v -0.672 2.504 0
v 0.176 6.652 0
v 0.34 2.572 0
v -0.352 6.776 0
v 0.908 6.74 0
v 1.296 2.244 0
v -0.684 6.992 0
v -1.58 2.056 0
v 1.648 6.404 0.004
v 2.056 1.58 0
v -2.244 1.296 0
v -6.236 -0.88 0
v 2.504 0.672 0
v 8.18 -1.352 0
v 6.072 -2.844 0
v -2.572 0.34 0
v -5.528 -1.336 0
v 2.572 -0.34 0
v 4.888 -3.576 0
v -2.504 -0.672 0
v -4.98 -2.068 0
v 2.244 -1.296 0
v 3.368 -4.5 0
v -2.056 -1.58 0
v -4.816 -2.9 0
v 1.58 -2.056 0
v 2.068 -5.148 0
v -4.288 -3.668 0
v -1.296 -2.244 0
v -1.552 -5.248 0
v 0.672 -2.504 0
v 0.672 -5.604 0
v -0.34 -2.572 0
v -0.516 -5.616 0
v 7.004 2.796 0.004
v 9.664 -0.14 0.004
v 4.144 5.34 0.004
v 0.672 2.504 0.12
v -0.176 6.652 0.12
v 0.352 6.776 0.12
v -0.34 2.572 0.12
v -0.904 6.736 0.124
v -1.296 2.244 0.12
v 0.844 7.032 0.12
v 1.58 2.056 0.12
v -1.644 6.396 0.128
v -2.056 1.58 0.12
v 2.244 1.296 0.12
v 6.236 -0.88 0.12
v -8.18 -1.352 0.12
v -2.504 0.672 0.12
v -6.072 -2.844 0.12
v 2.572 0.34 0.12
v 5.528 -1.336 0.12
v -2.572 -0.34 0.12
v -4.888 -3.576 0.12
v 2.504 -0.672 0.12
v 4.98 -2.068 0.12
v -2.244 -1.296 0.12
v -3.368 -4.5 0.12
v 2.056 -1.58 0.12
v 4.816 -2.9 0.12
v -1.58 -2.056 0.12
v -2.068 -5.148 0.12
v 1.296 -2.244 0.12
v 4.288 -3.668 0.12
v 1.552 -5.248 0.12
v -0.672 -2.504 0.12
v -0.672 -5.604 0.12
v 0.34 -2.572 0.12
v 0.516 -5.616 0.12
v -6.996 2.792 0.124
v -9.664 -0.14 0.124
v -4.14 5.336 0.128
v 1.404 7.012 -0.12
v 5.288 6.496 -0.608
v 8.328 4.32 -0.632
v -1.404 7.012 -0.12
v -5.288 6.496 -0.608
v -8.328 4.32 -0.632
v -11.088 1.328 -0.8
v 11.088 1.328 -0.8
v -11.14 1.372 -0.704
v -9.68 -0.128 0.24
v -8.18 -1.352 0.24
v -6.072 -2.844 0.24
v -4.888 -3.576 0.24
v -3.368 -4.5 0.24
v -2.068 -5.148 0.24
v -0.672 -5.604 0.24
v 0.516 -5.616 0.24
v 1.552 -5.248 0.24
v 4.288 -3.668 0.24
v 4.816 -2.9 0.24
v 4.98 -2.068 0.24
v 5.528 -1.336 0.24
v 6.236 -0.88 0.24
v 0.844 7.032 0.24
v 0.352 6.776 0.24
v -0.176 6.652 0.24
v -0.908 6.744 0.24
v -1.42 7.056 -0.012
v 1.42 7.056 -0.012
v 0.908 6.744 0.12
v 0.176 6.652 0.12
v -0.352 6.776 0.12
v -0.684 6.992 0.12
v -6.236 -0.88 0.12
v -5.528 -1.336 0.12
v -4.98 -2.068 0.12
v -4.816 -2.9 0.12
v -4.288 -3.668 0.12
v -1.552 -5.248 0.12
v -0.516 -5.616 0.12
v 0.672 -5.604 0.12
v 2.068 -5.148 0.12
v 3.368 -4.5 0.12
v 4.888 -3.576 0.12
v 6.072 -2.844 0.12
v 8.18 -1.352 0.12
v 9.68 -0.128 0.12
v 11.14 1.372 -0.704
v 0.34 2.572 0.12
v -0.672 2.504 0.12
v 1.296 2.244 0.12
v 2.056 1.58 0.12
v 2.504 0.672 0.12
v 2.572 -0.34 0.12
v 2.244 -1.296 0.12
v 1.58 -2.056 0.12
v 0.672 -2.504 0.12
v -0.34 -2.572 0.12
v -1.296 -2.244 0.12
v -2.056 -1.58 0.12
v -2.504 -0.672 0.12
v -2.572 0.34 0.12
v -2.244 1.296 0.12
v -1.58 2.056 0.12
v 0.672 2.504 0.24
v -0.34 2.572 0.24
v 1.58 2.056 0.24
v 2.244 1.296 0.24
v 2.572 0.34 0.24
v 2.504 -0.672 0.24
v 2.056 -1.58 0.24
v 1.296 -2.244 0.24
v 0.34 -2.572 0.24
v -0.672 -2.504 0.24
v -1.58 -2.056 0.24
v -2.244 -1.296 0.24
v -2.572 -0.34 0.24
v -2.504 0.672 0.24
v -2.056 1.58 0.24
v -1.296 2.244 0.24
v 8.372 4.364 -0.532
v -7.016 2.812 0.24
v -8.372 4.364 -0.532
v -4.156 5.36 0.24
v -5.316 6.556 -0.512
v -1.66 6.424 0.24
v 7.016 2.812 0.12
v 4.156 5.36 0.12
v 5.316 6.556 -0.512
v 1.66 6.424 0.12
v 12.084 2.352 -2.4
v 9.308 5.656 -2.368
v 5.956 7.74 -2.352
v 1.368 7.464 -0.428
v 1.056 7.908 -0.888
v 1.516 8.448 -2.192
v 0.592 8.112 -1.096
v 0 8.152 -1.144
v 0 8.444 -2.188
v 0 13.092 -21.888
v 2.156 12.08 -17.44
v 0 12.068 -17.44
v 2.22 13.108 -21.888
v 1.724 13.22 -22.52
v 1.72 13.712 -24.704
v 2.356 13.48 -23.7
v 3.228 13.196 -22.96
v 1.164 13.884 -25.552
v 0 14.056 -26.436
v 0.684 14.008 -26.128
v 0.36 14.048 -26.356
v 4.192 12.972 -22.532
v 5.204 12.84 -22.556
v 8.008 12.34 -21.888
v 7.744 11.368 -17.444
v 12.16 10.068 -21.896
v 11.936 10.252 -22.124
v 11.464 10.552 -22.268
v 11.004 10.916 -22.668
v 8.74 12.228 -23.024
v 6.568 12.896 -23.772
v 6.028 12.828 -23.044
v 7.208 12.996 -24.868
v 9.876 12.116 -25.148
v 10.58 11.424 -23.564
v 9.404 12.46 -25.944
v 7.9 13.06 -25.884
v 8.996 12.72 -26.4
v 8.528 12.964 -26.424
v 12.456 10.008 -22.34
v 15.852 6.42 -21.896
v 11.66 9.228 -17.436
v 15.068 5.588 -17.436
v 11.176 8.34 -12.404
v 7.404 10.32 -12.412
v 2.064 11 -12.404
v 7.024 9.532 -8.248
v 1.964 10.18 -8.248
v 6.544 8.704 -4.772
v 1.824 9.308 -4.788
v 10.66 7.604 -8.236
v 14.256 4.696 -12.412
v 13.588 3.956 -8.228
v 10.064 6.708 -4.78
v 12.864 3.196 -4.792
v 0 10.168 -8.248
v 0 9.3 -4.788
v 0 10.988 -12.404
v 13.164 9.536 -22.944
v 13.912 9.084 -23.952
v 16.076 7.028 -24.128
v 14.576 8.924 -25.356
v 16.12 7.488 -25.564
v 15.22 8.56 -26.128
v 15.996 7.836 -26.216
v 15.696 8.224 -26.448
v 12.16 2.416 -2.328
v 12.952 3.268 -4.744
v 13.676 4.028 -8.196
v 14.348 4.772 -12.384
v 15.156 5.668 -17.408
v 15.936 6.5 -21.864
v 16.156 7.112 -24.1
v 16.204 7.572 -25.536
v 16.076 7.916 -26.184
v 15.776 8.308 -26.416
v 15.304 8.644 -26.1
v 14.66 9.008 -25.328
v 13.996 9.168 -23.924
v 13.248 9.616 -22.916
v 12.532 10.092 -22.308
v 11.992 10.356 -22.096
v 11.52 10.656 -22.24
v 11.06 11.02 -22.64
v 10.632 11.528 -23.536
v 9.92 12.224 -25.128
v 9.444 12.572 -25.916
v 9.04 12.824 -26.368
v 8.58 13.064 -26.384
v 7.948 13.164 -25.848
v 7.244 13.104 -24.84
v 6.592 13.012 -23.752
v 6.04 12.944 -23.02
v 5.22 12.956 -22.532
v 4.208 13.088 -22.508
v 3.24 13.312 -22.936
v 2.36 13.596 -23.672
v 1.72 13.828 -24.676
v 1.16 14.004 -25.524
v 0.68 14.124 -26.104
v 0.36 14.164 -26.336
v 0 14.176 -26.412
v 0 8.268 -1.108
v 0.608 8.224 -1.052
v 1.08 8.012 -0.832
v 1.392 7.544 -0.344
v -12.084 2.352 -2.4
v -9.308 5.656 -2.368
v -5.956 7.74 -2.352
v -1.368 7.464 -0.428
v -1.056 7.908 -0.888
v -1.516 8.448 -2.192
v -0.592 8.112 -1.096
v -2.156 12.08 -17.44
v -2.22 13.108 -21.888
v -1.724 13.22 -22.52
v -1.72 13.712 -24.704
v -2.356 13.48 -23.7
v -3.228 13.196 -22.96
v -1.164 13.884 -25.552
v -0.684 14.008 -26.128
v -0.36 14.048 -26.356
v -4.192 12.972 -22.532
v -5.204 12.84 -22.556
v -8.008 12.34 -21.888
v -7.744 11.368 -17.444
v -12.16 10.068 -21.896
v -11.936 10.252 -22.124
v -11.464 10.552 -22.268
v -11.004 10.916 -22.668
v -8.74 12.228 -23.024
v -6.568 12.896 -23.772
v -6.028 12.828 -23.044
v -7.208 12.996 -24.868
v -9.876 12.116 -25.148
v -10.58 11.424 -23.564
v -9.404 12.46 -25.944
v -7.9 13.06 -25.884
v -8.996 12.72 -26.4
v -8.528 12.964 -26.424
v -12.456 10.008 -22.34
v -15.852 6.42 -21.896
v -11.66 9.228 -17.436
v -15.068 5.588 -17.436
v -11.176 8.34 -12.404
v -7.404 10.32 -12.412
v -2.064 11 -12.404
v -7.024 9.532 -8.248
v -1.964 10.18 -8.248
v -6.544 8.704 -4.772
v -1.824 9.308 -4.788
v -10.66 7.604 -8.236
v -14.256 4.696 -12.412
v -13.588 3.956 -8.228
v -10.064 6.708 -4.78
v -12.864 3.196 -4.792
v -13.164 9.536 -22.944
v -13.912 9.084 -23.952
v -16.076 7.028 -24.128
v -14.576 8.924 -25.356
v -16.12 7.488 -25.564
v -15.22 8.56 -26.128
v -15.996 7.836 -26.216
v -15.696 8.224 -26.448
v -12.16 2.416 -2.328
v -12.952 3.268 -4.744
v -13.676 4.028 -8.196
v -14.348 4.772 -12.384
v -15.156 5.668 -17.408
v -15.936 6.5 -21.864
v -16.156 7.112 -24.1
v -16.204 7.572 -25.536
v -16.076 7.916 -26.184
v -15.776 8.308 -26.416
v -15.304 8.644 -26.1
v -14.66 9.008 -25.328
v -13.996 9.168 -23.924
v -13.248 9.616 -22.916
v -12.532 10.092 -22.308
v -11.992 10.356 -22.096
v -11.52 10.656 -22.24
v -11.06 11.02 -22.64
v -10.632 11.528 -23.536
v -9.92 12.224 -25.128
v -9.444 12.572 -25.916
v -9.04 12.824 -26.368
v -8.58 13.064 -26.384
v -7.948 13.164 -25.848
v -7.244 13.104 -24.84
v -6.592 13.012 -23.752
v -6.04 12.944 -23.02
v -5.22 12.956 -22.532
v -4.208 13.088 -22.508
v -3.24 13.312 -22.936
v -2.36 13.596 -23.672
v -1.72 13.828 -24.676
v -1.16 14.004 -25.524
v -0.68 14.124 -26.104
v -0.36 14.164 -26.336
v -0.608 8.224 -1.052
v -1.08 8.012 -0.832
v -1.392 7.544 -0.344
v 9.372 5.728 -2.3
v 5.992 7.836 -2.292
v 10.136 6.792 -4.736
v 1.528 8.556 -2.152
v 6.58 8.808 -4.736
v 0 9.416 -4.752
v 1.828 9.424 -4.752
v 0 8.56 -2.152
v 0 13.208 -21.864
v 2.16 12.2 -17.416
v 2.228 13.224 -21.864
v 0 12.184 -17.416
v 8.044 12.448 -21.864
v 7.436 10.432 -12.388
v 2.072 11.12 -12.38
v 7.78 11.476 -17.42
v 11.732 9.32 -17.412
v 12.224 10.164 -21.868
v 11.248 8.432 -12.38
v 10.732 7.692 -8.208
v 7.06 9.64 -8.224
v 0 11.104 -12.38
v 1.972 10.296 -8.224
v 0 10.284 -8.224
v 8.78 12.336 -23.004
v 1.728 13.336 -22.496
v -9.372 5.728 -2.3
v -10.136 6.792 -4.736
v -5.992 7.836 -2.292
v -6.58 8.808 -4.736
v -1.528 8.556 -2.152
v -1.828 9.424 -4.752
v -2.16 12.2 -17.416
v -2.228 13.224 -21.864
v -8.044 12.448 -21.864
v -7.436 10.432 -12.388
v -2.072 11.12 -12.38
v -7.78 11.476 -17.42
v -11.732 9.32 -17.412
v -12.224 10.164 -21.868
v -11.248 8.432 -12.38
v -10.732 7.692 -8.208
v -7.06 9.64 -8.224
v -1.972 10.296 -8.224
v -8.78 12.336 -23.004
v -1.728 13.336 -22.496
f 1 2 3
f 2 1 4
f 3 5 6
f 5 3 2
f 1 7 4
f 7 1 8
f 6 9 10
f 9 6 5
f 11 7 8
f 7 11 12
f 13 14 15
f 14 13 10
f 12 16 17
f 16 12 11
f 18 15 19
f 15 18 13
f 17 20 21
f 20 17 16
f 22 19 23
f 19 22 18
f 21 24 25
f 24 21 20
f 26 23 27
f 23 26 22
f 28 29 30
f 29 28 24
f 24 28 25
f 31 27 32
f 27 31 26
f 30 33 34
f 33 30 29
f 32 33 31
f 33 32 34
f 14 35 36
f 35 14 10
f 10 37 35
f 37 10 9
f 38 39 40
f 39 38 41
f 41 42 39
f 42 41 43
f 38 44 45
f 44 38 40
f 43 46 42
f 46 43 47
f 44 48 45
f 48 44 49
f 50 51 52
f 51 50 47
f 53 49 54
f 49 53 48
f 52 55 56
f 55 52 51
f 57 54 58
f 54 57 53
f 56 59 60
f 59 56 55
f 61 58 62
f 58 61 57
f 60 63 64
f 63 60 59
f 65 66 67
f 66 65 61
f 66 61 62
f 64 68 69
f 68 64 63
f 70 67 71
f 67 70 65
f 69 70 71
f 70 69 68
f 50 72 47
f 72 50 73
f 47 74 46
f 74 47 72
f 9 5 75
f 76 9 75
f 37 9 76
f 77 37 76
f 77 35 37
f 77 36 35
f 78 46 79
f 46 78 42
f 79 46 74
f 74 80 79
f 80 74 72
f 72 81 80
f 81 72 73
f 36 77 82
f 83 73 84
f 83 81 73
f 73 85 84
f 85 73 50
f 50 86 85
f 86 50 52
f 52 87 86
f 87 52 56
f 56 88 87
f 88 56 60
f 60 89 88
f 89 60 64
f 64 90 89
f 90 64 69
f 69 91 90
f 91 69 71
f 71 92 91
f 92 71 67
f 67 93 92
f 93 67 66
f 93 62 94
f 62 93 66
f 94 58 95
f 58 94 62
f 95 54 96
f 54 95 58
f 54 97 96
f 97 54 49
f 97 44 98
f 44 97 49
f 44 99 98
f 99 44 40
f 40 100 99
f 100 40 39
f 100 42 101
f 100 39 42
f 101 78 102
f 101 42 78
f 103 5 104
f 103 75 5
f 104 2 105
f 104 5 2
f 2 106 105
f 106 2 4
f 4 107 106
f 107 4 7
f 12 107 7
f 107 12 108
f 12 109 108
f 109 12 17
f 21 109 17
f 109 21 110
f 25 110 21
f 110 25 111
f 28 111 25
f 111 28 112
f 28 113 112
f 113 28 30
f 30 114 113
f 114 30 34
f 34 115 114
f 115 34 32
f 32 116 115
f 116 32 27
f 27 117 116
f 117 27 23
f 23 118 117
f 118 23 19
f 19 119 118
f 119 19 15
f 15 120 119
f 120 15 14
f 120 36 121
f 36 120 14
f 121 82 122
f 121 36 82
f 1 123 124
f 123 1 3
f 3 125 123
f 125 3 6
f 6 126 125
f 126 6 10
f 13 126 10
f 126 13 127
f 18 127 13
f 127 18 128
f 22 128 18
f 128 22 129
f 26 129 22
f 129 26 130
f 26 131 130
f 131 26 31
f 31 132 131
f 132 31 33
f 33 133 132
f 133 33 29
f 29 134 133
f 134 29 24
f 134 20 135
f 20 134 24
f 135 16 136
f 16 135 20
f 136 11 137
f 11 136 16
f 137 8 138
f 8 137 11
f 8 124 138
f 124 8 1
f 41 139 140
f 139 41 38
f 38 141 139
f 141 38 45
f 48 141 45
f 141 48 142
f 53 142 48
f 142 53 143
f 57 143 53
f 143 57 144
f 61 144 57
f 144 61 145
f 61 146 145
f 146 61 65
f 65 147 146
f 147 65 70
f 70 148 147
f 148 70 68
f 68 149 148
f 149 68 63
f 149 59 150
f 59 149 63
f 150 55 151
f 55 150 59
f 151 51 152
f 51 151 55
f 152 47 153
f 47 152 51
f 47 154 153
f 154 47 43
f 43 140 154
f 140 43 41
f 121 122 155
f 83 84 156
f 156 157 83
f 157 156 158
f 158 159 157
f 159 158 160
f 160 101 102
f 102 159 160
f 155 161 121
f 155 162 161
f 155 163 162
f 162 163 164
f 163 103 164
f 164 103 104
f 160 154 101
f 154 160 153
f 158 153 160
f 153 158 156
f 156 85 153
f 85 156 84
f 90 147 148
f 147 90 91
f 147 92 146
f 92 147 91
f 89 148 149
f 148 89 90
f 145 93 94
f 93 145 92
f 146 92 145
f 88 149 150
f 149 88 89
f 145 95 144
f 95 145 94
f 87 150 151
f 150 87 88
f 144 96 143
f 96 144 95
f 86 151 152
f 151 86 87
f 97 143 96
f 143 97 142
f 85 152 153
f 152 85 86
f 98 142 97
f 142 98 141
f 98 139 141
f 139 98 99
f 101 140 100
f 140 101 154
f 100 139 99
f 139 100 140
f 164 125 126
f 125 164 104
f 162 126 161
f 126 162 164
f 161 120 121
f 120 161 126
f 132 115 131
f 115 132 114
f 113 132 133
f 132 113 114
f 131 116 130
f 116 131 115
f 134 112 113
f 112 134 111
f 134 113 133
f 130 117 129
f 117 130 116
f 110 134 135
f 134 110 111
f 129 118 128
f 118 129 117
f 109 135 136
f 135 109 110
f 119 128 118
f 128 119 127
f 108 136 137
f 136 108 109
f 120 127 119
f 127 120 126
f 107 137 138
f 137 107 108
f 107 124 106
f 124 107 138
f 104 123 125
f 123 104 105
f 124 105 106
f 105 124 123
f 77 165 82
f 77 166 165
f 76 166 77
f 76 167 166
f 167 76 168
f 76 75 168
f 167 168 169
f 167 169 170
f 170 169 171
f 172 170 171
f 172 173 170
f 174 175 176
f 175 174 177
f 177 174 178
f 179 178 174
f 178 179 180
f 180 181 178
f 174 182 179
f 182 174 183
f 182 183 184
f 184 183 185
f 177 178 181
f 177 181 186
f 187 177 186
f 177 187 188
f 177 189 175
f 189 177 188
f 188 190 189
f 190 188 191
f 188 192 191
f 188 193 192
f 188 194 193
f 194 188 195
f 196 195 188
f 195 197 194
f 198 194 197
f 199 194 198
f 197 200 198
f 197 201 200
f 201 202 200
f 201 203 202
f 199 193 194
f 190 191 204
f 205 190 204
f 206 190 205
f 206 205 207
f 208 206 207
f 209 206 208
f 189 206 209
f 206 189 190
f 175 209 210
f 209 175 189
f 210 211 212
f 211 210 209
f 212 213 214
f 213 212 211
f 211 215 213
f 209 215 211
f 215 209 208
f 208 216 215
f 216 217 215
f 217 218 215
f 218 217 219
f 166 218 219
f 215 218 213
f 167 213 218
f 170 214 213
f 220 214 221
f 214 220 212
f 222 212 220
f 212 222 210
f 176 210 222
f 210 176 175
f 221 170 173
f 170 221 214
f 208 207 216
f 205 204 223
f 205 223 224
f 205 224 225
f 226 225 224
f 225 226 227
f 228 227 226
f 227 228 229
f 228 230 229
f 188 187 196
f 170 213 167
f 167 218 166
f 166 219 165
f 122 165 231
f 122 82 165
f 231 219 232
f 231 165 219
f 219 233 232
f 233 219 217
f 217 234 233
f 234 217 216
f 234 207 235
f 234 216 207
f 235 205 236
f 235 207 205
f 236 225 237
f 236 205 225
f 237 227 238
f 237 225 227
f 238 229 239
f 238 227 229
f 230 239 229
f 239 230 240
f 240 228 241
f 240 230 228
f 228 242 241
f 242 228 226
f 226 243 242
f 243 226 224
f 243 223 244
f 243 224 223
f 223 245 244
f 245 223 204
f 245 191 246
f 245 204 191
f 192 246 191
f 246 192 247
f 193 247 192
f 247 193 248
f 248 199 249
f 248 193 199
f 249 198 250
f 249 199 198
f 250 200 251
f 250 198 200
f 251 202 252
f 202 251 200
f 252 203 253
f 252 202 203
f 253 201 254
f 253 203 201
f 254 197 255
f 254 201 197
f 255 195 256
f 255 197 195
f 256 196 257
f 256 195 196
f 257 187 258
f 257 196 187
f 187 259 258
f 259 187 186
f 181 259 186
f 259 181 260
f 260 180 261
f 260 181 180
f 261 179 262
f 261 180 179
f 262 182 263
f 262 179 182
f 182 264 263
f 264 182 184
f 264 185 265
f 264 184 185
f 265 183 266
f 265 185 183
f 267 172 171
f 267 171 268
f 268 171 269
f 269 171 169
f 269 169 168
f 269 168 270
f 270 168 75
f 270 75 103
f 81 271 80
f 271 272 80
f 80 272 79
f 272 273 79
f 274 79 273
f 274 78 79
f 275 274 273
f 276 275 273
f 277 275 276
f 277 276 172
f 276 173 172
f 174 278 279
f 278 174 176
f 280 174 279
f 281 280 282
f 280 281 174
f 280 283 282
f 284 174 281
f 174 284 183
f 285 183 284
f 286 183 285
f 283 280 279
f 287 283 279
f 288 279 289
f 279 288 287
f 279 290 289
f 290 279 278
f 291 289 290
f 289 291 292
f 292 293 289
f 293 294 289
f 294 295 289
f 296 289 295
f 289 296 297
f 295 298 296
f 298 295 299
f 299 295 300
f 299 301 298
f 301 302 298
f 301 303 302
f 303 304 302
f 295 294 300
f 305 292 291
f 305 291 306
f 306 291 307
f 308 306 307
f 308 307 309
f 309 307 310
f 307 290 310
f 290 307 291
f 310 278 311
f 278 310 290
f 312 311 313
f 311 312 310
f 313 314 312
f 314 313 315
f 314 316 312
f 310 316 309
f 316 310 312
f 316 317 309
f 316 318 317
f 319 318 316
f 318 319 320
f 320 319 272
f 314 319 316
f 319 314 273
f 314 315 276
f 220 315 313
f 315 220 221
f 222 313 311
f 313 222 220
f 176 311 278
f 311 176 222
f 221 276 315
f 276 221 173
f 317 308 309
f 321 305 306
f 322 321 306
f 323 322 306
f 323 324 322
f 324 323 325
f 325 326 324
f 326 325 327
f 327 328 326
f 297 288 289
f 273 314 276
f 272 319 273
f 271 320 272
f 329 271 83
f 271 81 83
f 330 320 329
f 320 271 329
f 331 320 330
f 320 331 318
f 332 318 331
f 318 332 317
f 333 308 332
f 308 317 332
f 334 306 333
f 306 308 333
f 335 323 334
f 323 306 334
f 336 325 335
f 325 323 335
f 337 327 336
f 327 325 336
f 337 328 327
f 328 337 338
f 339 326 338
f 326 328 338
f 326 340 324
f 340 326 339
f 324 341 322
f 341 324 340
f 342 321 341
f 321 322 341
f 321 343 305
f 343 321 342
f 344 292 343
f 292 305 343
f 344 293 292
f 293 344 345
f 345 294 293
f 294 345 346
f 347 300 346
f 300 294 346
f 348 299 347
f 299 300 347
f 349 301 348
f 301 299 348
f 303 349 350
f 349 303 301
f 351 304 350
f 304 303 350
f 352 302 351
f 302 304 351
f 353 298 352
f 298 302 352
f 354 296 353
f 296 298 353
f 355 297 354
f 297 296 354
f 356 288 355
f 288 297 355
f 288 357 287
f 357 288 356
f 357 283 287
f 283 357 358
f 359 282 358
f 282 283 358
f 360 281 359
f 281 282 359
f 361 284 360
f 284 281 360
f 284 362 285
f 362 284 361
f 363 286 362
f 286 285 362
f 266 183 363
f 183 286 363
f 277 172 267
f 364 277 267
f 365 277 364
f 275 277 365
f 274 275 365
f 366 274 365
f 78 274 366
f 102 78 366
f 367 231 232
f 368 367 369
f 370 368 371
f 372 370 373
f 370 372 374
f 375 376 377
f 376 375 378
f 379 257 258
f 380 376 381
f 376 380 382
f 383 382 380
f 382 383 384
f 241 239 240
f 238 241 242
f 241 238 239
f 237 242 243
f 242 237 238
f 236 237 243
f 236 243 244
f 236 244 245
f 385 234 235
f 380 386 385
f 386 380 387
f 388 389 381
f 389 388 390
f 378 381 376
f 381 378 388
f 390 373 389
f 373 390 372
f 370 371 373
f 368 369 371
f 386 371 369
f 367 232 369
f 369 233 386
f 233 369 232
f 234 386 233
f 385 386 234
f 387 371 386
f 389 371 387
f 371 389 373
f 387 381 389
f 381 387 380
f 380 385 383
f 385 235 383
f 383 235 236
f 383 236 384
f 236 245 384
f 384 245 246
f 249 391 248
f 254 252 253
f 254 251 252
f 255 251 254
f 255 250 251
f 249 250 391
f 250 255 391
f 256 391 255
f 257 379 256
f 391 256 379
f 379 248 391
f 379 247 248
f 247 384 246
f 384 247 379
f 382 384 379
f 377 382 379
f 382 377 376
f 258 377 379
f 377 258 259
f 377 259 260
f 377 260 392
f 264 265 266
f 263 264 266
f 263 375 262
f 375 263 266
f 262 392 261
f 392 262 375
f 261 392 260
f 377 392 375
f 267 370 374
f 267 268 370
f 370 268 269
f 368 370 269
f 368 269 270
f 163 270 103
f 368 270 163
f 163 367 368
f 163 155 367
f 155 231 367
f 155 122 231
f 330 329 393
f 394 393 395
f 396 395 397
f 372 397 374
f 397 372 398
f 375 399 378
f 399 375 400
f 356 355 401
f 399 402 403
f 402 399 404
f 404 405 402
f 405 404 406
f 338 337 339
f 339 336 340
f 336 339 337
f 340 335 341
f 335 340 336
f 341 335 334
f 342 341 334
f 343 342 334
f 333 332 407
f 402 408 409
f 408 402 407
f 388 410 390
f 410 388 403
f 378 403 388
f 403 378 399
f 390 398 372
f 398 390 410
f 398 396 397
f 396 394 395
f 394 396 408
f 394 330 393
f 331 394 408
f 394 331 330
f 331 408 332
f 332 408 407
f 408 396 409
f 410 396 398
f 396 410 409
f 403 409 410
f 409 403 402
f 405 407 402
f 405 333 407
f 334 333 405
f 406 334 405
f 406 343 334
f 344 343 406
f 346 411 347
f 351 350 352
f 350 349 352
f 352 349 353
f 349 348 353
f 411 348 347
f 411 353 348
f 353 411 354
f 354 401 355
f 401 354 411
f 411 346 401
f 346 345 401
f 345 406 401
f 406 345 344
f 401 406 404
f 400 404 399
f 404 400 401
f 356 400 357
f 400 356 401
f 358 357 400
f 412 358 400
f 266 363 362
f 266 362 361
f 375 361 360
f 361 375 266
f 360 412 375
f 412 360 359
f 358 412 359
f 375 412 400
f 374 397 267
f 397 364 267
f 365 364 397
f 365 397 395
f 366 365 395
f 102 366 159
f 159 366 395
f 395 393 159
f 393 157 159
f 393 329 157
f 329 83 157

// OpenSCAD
use <../lib.scad>
use <s/50231s01.scad>
use <s/50231s02.scad>
use <s/56630s01.scad>
use <s/56630s02.scad>
$fa=1; $fs=0.2;
function ldraw_lib__56630c01(realsolid=false) = [
// 0 Minifig Cape Cloth Scalloped  5 Points (Formed)
// 0 Name: 56630c01.dat
// 0 Author: Philippe Hurbain [Philo]
// 0 !LDRAW_ORG Part UPDATE 2019-01
// 0 !LICENSE Licensed under CC BY 2.0 and CC BY 4.0 : see CAreadme.txt
// 
// 0 !HELP Place at y = 0 on torso, head at y = -0.6
// 
// 0 BFC CERTIFY CCW
  [0,"BFC","CERTIFY"],
  [0,"BFC","CCW"],
// 
// 0 !CATEGORY Minifig Neckwear
// 0 !KEYWORDS Batgirl, Batman, Cloak, Drape, Neckwear, Poncho, Robin, Shawl
// 
// 0 !HISTORY 2014-12-23 [PTadmin] Official Update 2014-02
// 0 !HISTORY 2019-01-26 [cwdee] Update category
// 0 !HISTORY 2019-06-28 [PTadmin] Official Update 2019-01
// 
// 
// 1 16 0 0 0 1 0 0 0 1 0 0 0 1 s\50231s01.dat
  [1,16,0,0,0,1,0,0,0,1,0,0,0,1, ldraw_lib__s__50231s01(realsolid)],
// 1 16 0 0 0 1 0 0 0 1 0 0 0 1 s\50231s02.dat
  [1,16,0,0,0,1,0,0,0,1,0,0,0,1, ldraw_lib__s__50231s02(realsolid)],
// 1 16 0 0 0 1 0 0 0 1 0 0 0 1 s\56630s01.dat
  [1,16,0,0,0,1,0,0,0,1,0,0,0,1, ldraw_lib__s__56630s01(realsolid)],
// 1 16 0 0 0 -1 0 0 0 1 0 0 0 1 s\56630s01.dat
  [1,16,0,0,0,-1,0,0,0,1,0,0,0,1, ldraw_lib__s__56630s01(realsolid)],
// 1 16 0 0 0 1 0 0 0 1 0 0 0 1 s\56630s02.dat
  [1,16,0,0,0,1,0,0,0,1,0,0,0,1, ldraw_lib__s__56630s02(realsolid)],
// 1 16 0 0 0 -1 0 0 0 1 0 0 0 1 s\56630s02.dat
  [1,16,0,0,0,-1,0,0,0,1,0,0,0,1, ldraw_lib__s__56630s02(realsolid)],
];
module ldraw_lib__56630c01(step=0, col=false, unit=2/5, alt=false, line=0.2, solid=!$preview)
    makepoly(ldraw_lib__56630c01(solid), step=step, col=col, unit=unit, alt=alt, line=line, solid=solid);
ldraw_lib__56630c01(line=0.2);
